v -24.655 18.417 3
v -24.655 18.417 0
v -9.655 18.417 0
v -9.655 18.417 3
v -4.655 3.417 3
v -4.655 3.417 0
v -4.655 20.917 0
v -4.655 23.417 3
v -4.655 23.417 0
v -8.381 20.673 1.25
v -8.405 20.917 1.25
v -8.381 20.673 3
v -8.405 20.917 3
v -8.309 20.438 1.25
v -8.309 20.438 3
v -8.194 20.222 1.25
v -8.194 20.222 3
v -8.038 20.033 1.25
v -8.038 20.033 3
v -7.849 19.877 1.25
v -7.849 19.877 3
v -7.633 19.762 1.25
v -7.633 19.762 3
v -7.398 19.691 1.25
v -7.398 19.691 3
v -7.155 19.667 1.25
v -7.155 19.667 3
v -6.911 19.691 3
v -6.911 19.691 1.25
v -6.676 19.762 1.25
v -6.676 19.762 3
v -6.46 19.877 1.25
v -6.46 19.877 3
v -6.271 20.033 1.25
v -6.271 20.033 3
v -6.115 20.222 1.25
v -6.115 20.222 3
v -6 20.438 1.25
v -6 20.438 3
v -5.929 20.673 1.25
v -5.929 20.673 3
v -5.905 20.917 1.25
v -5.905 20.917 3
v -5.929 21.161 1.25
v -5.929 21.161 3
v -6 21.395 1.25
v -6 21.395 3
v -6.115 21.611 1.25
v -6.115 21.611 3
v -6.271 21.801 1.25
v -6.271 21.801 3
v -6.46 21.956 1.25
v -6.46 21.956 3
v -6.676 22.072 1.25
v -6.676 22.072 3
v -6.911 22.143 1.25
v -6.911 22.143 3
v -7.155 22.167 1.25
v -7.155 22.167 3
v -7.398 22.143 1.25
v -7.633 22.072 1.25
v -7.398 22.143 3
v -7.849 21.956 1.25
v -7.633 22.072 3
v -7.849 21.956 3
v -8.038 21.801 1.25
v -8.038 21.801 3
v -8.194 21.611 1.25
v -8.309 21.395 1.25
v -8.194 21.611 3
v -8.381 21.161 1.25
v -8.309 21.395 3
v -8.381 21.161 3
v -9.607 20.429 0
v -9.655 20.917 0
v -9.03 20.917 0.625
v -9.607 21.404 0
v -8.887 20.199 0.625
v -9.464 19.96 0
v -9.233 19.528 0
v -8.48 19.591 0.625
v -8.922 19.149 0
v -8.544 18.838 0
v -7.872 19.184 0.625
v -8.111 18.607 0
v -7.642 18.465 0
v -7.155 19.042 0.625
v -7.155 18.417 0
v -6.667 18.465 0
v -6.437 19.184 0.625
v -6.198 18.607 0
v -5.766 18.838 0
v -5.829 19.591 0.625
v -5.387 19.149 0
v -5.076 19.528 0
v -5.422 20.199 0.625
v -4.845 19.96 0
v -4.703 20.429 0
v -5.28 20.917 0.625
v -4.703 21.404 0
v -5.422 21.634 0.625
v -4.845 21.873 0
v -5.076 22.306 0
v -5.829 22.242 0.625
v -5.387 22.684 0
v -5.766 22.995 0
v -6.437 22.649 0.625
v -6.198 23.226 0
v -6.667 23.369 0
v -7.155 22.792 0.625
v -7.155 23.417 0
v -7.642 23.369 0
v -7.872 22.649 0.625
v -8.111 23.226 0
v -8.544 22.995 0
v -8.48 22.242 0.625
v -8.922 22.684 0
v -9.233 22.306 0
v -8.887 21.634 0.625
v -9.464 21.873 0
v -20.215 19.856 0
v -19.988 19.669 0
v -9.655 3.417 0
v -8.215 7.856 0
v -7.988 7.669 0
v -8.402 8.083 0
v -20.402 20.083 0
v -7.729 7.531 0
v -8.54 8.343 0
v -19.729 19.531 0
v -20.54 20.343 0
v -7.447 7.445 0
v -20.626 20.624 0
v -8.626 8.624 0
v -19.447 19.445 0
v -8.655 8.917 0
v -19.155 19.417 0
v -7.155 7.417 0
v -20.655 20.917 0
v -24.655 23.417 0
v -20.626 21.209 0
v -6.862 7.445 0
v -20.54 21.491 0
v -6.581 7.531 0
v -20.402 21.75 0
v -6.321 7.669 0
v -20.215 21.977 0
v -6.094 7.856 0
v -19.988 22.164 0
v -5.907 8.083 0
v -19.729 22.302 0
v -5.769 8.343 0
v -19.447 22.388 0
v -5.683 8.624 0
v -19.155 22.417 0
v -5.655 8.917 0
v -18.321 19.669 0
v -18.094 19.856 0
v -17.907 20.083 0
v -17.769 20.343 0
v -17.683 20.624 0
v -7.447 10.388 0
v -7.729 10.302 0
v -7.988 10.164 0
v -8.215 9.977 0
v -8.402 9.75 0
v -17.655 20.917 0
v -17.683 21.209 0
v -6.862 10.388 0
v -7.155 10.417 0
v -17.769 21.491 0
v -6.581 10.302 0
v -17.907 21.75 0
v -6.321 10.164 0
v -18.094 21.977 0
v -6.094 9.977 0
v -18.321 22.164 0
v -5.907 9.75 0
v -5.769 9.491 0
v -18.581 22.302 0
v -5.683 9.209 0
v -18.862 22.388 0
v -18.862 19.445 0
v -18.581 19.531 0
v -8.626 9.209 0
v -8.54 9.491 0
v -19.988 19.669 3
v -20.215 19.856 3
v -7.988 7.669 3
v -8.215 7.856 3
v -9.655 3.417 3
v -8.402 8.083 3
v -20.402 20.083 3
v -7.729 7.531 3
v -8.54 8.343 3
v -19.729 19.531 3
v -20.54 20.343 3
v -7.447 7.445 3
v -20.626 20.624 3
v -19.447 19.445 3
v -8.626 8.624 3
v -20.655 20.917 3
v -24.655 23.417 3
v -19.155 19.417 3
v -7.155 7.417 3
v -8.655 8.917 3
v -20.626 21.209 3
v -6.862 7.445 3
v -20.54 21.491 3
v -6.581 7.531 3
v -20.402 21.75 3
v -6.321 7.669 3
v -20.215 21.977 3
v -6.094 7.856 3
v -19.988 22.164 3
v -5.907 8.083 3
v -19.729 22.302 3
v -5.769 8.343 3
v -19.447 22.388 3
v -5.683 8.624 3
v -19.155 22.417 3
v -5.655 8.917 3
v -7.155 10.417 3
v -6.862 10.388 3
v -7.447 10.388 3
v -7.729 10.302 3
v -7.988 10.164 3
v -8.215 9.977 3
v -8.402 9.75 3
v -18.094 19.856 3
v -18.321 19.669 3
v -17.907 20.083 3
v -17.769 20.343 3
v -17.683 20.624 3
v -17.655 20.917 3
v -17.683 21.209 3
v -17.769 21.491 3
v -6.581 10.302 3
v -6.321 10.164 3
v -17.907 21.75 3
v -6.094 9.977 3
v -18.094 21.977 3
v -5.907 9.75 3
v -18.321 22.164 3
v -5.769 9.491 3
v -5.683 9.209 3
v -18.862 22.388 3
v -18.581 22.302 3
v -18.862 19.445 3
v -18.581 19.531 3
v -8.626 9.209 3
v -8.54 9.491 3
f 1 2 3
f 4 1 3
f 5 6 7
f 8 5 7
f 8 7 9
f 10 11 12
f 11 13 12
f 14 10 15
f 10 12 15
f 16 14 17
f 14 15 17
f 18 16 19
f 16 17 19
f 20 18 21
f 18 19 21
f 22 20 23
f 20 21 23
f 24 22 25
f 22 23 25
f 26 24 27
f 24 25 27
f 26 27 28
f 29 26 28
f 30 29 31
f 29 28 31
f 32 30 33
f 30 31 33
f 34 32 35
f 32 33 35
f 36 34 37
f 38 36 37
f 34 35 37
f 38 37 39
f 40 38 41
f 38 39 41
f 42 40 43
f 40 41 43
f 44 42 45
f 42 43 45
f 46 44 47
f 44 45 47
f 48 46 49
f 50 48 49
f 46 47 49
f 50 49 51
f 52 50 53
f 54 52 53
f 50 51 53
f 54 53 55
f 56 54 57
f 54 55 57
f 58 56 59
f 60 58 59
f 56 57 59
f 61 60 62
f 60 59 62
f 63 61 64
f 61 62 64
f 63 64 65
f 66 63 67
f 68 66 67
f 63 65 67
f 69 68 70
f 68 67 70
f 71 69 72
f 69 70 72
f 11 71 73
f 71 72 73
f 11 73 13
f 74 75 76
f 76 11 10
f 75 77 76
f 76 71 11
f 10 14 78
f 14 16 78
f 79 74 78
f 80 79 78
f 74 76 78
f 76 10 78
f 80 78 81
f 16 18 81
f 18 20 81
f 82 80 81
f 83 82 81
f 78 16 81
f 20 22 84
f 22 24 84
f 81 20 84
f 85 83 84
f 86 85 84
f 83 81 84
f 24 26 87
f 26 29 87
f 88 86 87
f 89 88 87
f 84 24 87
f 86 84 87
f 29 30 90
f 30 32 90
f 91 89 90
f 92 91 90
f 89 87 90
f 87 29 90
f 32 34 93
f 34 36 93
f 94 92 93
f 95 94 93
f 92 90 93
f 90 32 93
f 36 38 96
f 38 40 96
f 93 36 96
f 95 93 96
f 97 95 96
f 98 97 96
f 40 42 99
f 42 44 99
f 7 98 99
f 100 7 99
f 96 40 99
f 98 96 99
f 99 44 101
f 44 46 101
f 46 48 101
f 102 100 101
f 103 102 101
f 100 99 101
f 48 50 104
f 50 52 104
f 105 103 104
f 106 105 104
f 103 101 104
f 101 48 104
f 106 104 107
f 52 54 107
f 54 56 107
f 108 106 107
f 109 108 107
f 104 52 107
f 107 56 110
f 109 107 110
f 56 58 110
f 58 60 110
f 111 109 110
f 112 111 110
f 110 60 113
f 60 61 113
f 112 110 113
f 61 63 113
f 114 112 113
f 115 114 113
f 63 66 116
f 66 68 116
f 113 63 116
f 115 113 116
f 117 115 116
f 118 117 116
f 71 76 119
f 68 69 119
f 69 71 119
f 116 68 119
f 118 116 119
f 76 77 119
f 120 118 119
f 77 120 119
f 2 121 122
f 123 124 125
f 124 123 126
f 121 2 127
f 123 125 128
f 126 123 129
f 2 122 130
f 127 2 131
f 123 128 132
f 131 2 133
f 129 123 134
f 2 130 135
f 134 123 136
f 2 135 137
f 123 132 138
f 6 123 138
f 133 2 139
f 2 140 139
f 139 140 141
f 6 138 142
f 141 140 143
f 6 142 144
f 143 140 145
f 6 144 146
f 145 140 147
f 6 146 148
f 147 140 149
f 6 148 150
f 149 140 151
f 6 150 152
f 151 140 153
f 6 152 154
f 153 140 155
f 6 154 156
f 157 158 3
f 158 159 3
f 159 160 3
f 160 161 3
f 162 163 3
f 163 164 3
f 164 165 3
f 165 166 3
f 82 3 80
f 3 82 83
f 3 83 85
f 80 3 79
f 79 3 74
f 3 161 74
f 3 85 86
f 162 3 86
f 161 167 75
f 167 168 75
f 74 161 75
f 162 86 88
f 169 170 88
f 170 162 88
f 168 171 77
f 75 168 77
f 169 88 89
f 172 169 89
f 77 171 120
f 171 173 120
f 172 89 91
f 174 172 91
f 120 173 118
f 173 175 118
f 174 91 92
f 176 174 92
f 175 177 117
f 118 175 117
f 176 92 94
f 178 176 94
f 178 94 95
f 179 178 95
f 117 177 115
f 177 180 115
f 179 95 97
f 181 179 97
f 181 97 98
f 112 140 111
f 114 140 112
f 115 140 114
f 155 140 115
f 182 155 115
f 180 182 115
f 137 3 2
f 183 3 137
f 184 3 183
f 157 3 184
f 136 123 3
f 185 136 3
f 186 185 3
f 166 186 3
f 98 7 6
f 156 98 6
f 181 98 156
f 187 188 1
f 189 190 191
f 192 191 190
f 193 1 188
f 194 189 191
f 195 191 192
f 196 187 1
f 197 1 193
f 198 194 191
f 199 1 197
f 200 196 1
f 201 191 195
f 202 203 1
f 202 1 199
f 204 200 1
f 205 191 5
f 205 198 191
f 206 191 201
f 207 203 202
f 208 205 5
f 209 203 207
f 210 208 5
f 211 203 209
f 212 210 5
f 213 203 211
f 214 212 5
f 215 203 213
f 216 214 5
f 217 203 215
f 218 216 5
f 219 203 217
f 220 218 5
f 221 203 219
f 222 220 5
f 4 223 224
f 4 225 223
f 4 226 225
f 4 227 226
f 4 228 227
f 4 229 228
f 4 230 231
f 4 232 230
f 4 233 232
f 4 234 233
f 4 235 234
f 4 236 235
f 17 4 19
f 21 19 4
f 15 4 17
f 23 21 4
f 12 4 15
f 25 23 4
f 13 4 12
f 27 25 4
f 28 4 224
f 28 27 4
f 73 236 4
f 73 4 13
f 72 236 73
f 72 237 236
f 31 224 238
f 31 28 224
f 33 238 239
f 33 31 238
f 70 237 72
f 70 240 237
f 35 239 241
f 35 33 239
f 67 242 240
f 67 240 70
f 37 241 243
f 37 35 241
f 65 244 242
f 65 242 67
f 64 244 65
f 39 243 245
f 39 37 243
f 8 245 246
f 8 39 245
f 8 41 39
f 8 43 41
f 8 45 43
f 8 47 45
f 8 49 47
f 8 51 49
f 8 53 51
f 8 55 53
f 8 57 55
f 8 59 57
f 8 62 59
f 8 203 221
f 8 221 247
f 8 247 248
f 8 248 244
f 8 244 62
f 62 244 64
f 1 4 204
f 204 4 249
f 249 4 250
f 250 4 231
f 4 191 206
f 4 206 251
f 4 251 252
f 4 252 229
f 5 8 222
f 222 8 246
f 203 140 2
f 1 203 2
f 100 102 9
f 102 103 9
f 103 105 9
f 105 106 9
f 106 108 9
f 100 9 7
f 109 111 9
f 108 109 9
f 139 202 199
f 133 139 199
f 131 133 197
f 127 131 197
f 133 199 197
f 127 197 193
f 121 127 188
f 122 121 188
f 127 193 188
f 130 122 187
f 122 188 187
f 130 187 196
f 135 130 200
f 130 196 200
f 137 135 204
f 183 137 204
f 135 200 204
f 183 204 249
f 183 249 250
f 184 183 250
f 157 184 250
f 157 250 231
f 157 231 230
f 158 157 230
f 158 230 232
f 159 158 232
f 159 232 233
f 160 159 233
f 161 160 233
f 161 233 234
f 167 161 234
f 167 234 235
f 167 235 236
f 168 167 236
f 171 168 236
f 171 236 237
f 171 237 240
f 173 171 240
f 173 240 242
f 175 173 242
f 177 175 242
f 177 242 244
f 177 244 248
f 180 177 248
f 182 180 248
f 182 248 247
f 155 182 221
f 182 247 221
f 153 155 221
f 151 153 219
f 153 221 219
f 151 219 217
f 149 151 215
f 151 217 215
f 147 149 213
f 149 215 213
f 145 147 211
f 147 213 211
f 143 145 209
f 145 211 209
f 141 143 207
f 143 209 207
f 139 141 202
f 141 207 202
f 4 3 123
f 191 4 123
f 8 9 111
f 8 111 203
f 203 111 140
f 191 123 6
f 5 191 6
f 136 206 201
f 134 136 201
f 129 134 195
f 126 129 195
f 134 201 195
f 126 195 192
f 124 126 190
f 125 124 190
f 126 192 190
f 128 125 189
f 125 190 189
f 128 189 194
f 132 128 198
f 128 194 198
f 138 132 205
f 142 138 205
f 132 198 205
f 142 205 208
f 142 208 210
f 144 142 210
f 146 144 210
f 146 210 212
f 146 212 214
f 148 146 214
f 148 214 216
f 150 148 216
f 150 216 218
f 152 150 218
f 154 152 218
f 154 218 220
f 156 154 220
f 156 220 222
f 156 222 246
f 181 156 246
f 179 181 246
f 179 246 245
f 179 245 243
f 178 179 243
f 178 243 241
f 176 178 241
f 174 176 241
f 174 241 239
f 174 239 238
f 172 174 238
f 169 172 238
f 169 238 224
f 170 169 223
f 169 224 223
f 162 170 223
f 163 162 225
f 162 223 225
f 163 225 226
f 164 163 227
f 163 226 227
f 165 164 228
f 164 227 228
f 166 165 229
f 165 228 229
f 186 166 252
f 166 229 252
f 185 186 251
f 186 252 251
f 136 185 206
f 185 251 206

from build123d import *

# Parameters (mm, degrees)
F1_DEPTH       = 3
F2_D           = 3
F3_D           = 2.5
F3_CSINK_D     = 5
F3_CSINK_ANGLE = 90


with BuildPart() as f1:
    # F0 (on Top) → F1 (new body)
    with BuildSketch(Plane.XY):
        Polygon((-4.6546061151, 23.416666063), (-24.6546061151, 23.416666063), (-24.6546061151, 18.416666063), (-9.6546061151, 18.416666063), align=None)
        Polygon((-4.6546061151, 3.416666063), (-4.6546061151, 23.416666063), (-9.6546061151, 18.416666063), (-9.6546061151, 3.416666063), align=None)
    extrude(amount=F1_DEPTH)

    # F2 (through all)
    with Locations(Plane(origin=(0, 0, 0), x_dir=(1, 0, 0), z_dir=(0, 0, -1))):
        with Locations((-7.1546061151, -8.916666063), (-19.1546061151, -20.916666063)):
            Hole(F2_D / 2)

    # F3 (through all)
    with Locations(Plane(origin=(0, 0, 0), x_dir=(1, 0, 0), z_dir=(0, 0, -1))):
        with Locations((-7.1546061151, -20.916666063)):
            CounterSinkHole(F3_D / 2, F3_CSINK_D / 2, counter_sink_angle=F3_CSINK_ANGLE)


solid = f1.part
